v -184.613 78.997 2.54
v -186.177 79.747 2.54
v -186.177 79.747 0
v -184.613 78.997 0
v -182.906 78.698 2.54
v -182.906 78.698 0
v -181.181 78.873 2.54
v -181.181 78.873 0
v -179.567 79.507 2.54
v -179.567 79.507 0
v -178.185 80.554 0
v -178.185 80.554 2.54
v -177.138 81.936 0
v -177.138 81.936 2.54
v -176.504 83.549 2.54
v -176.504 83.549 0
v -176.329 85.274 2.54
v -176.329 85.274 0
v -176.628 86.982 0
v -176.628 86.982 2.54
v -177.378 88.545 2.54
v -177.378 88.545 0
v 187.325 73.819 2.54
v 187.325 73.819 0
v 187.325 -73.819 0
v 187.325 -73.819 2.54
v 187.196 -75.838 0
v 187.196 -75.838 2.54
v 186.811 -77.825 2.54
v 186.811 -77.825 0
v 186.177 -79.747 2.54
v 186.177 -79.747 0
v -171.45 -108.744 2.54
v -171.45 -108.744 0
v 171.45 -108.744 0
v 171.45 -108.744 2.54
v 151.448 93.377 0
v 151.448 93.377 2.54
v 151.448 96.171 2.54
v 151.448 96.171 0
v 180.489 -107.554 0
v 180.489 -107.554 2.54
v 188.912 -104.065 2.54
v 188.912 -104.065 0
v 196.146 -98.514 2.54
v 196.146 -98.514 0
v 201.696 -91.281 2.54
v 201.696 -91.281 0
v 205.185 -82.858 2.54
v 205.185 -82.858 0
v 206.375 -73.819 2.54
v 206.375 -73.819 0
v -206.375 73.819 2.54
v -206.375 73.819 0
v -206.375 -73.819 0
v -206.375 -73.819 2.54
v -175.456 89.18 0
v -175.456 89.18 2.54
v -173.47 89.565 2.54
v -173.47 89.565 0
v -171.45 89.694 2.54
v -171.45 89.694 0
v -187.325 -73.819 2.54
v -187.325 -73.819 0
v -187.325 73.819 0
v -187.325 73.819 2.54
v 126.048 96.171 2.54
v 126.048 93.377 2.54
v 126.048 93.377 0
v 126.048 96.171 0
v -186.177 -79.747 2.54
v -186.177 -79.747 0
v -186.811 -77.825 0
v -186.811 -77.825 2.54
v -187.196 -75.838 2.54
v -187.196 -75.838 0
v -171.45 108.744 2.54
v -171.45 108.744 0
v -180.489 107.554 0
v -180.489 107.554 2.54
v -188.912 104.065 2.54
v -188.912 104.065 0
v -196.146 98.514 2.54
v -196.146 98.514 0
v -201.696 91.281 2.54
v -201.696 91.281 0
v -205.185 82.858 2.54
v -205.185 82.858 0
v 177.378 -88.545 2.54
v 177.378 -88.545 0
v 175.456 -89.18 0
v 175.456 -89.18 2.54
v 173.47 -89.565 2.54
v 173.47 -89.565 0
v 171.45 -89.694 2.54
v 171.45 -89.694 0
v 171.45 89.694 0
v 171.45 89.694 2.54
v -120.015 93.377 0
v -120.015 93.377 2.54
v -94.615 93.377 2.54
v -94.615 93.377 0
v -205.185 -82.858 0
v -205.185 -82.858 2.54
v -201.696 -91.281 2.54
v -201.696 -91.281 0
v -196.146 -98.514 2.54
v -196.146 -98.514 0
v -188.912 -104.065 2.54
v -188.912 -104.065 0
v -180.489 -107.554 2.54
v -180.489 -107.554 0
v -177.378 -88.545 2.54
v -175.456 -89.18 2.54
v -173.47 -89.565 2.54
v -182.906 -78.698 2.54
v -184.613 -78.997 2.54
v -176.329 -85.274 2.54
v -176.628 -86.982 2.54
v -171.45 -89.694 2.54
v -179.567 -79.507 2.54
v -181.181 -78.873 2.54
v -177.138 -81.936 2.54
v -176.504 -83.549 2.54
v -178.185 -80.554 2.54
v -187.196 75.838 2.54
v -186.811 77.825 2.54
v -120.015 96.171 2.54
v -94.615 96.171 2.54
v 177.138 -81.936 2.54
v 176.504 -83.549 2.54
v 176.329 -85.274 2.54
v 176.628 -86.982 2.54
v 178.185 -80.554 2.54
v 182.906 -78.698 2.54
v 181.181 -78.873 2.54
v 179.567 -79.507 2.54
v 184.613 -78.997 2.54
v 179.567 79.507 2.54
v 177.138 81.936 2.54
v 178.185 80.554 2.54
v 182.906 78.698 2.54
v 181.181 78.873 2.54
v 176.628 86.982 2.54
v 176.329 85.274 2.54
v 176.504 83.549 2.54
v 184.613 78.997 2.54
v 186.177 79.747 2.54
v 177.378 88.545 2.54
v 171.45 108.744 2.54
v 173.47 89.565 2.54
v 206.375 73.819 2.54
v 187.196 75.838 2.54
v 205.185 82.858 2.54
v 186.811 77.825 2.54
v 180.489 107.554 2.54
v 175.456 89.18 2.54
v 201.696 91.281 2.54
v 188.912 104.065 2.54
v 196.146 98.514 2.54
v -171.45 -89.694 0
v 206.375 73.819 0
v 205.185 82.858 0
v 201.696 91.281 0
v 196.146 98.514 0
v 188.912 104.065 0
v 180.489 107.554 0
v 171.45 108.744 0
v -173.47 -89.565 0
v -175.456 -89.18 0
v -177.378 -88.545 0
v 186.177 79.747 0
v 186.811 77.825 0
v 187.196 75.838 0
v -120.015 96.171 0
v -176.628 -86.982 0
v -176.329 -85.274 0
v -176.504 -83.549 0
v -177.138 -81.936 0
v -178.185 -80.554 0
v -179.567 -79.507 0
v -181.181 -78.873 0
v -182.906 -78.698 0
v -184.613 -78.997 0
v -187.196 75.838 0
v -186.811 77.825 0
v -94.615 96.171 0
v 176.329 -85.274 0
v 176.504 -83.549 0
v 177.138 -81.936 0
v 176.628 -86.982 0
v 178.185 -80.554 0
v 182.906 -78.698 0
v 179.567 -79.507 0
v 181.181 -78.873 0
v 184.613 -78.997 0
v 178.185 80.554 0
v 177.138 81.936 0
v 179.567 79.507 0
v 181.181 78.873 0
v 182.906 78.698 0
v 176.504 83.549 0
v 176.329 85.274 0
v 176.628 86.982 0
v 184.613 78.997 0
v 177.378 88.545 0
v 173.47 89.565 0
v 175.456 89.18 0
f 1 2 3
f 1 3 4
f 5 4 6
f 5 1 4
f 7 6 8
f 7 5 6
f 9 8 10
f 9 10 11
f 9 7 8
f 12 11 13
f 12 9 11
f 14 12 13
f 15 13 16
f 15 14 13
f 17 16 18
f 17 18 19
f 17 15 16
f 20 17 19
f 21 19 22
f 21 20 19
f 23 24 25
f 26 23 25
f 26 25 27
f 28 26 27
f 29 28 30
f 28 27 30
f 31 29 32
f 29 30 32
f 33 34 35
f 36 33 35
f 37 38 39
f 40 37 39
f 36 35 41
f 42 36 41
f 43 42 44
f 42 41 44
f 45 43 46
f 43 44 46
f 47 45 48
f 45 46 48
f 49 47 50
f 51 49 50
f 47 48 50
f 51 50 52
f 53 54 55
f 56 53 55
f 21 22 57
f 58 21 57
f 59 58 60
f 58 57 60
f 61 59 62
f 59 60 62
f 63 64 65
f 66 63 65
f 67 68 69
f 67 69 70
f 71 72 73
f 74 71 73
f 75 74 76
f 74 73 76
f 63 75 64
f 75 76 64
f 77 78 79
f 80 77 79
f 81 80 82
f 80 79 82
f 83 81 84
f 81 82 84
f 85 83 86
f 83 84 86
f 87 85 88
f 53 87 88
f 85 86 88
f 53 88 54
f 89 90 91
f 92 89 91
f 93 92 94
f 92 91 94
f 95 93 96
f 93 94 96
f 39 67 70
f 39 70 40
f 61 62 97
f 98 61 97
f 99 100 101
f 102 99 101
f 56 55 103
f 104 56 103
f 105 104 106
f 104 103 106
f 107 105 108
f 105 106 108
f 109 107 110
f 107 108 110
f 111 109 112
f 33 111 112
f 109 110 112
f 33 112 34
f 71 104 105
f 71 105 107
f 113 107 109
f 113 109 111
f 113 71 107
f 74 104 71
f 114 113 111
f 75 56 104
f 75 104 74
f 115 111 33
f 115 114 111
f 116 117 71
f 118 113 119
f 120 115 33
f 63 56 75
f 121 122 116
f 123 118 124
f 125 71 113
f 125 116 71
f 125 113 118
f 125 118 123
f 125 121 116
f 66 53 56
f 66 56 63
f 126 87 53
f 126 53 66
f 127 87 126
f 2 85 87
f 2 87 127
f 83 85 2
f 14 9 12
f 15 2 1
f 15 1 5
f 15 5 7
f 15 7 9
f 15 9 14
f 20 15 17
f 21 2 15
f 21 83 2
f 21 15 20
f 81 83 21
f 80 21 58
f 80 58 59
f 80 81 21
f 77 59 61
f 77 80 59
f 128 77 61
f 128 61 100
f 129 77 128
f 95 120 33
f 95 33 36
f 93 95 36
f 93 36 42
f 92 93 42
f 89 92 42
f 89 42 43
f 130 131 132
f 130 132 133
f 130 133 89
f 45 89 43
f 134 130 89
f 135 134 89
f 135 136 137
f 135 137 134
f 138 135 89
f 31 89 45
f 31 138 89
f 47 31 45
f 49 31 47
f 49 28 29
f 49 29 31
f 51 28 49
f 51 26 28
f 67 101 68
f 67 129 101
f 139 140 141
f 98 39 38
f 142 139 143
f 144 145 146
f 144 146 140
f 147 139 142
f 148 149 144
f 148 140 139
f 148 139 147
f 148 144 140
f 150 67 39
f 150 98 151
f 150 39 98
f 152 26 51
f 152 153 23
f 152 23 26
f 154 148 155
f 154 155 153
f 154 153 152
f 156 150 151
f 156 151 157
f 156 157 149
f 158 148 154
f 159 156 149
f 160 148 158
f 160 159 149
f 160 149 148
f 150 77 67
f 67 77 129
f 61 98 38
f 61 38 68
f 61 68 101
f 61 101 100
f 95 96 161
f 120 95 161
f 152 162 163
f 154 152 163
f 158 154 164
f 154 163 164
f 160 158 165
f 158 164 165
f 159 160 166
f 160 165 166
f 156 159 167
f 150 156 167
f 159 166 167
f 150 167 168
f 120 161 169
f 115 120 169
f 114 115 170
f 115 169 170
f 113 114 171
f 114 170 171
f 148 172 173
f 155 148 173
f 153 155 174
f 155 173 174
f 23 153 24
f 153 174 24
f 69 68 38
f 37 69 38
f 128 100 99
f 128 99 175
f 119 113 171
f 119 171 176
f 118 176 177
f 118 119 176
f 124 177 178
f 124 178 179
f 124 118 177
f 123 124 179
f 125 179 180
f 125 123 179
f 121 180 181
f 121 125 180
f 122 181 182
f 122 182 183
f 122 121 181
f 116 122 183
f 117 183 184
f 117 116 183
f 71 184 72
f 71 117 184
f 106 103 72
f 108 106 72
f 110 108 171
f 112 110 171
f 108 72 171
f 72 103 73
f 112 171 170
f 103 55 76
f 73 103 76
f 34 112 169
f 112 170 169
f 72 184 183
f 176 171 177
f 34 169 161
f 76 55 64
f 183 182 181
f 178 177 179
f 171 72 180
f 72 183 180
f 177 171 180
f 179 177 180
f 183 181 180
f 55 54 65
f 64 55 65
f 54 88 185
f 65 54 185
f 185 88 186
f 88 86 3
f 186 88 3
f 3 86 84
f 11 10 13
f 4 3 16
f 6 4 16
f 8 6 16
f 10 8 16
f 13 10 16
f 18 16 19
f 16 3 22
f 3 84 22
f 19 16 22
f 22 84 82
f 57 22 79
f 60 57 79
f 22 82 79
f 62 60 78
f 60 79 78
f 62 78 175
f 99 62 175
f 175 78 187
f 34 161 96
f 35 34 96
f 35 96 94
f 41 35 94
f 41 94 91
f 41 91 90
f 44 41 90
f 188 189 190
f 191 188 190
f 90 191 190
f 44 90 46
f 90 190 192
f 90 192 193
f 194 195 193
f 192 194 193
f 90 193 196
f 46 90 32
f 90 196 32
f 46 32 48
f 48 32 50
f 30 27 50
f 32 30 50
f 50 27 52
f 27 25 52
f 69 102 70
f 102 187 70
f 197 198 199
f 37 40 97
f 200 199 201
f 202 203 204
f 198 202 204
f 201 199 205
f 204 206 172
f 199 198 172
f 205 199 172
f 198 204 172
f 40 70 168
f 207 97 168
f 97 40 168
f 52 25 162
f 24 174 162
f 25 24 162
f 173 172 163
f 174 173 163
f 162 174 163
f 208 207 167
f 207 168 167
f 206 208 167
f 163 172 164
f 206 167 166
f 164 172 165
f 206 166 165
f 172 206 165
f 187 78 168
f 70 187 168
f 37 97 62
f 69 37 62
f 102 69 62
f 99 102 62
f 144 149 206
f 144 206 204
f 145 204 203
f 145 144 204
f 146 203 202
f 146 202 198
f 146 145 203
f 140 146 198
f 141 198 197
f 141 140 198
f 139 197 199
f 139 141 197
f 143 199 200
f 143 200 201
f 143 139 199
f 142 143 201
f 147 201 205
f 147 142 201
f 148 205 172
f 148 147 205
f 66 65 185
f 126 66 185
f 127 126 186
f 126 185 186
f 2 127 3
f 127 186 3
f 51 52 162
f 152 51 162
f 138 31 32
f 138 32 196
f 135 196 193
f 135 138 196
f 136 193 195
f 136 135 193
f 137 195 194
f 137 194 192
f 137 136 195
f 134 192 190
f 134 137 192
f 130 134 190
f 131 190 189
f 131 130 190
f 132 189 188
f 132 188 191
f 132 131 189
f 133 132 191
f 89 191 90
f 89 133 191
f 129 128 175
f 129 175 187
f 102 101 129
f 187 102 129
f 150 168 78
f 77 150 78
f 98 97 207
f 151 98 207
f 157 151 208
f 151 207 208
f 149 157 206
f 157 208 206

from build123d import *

# Parameters (mm, degrees)
F1_DEPTH = 2.54
F4_DEPTH = 2.54
F5_W     = 25.4
F5_H     = 2.794
F6_DEPTH = 25.4


with BuildPart() as f1:
    # F0 (on Top) → F1 (new body)
    with BuildSketch(Plane.XY):
        with BuildLine():
            Line((206.375, -73.81875), (206.375, 73.81875))
            ThreePointArc((206.375, 73.81875), (196.145704, 98.514454), (171.45, 108.74375))
            Line((171.45, 108.74375), (-171.45, 108.74375))
            ThreePointArc((-171.45, 108.74375), (-196.145704, 98.514454), (-206.375, 73.81875))
            Line((-206.375, 73.81875), (-206.375, -73.81875))
            ThreePointArc((-206.375, -73.81875), (-196.145704, -98.514454), (-171.45, -108.74375))
            Line((-171.45, -108.74375), (171.45, -108.74375))
            ThreePointArc((171.45, -108.74375), (196.145704, -98.514454), (206.375, -73.81875))
        make_face()
        with BuildLine():
            ThreePointArc((187.325, -73.81875), (182.67532, -85.04407), (171.45, -89.69375))
            Line((171.45, -89.69375), (-171.45, -89.69375))
            ThreePointArc((-171.45, -89.69375), (-182.67532, -85.04407), (-187.325, -73.81875))
            Line((-187.325, -73.81875), (-187.325, 73.81875))
            ThreePointArc((-187.325, 73.81875), (-182.67532, 85.04407), (-171.45, 89.69375))
            Line((-171.45, 89.69375), (171.45, 89.69375))
            ThreePointArc((171.45, 89.69375), (182.67532, 85.04407), (187.325, 73.81875))
            Line((187.325, 73.81875), (187.325, -73.81875))
        make_face(mode=Mode.SUBTRACT)
    extrude(amount=F1_DEPTH)

    # F3 (on face) → F4 (join, through all)
    with BuildSketch(Plane.XY.offset(2.54)):
        with BuildLine():
            ThreePointArc((-186.176704, 79.746635), (-178.185192, 80.553942), (-177.377885, 88.545454))
            ThreePointArc((-177.377885, 88.545454), (-182.67532, 85.04407), (-186.176704, 79.746635))
        make_face()
        with BuildLine():
            ThreePointArc((186.176704, 79.746635), (182.67532, 85.04407), (177.377885, 88.545454))
            ThreePointArc((177.377885, 88.545454), (178.185192, 80.553942), (186.176704, 79.746635))
        make_face()
        with BuildLine():
            ThreePointArc((177.377885, -88.545454), (182.67532, -85.04407), (186.176704, -79.746635))
            ThreePointArc((186.176704, -79.746635), (178.185192, -80.553942), (177.377885, -88.545454))
        make_face()
        with BuildLine():
            ThreePointArc((-177.377885, -88.545454), (-178.185192, -80.553942), (-186.176704, -79.746635))
            ThreePointArc((-186.176704, -79.746635), (-182.67532, -85.04407), (-177.377885, -88.545454))
        make_face()
    extrude(amount=-F4_DEPTH)

    # F5 (on face) → F6 (cut)
    with BuildSketch(Plane.XY.offset(2.54)):
        with Locations((-107.315, 94.77375)):
            Rectangle(F5_W, F5_H)
        with Locations((138.7475, 94.77375)):
            Rectangle(F5_W, F5_H)
    extrude(amount=-F6_DEPTH, mode=Mode.SUBTRACT)


solid = f1.part
